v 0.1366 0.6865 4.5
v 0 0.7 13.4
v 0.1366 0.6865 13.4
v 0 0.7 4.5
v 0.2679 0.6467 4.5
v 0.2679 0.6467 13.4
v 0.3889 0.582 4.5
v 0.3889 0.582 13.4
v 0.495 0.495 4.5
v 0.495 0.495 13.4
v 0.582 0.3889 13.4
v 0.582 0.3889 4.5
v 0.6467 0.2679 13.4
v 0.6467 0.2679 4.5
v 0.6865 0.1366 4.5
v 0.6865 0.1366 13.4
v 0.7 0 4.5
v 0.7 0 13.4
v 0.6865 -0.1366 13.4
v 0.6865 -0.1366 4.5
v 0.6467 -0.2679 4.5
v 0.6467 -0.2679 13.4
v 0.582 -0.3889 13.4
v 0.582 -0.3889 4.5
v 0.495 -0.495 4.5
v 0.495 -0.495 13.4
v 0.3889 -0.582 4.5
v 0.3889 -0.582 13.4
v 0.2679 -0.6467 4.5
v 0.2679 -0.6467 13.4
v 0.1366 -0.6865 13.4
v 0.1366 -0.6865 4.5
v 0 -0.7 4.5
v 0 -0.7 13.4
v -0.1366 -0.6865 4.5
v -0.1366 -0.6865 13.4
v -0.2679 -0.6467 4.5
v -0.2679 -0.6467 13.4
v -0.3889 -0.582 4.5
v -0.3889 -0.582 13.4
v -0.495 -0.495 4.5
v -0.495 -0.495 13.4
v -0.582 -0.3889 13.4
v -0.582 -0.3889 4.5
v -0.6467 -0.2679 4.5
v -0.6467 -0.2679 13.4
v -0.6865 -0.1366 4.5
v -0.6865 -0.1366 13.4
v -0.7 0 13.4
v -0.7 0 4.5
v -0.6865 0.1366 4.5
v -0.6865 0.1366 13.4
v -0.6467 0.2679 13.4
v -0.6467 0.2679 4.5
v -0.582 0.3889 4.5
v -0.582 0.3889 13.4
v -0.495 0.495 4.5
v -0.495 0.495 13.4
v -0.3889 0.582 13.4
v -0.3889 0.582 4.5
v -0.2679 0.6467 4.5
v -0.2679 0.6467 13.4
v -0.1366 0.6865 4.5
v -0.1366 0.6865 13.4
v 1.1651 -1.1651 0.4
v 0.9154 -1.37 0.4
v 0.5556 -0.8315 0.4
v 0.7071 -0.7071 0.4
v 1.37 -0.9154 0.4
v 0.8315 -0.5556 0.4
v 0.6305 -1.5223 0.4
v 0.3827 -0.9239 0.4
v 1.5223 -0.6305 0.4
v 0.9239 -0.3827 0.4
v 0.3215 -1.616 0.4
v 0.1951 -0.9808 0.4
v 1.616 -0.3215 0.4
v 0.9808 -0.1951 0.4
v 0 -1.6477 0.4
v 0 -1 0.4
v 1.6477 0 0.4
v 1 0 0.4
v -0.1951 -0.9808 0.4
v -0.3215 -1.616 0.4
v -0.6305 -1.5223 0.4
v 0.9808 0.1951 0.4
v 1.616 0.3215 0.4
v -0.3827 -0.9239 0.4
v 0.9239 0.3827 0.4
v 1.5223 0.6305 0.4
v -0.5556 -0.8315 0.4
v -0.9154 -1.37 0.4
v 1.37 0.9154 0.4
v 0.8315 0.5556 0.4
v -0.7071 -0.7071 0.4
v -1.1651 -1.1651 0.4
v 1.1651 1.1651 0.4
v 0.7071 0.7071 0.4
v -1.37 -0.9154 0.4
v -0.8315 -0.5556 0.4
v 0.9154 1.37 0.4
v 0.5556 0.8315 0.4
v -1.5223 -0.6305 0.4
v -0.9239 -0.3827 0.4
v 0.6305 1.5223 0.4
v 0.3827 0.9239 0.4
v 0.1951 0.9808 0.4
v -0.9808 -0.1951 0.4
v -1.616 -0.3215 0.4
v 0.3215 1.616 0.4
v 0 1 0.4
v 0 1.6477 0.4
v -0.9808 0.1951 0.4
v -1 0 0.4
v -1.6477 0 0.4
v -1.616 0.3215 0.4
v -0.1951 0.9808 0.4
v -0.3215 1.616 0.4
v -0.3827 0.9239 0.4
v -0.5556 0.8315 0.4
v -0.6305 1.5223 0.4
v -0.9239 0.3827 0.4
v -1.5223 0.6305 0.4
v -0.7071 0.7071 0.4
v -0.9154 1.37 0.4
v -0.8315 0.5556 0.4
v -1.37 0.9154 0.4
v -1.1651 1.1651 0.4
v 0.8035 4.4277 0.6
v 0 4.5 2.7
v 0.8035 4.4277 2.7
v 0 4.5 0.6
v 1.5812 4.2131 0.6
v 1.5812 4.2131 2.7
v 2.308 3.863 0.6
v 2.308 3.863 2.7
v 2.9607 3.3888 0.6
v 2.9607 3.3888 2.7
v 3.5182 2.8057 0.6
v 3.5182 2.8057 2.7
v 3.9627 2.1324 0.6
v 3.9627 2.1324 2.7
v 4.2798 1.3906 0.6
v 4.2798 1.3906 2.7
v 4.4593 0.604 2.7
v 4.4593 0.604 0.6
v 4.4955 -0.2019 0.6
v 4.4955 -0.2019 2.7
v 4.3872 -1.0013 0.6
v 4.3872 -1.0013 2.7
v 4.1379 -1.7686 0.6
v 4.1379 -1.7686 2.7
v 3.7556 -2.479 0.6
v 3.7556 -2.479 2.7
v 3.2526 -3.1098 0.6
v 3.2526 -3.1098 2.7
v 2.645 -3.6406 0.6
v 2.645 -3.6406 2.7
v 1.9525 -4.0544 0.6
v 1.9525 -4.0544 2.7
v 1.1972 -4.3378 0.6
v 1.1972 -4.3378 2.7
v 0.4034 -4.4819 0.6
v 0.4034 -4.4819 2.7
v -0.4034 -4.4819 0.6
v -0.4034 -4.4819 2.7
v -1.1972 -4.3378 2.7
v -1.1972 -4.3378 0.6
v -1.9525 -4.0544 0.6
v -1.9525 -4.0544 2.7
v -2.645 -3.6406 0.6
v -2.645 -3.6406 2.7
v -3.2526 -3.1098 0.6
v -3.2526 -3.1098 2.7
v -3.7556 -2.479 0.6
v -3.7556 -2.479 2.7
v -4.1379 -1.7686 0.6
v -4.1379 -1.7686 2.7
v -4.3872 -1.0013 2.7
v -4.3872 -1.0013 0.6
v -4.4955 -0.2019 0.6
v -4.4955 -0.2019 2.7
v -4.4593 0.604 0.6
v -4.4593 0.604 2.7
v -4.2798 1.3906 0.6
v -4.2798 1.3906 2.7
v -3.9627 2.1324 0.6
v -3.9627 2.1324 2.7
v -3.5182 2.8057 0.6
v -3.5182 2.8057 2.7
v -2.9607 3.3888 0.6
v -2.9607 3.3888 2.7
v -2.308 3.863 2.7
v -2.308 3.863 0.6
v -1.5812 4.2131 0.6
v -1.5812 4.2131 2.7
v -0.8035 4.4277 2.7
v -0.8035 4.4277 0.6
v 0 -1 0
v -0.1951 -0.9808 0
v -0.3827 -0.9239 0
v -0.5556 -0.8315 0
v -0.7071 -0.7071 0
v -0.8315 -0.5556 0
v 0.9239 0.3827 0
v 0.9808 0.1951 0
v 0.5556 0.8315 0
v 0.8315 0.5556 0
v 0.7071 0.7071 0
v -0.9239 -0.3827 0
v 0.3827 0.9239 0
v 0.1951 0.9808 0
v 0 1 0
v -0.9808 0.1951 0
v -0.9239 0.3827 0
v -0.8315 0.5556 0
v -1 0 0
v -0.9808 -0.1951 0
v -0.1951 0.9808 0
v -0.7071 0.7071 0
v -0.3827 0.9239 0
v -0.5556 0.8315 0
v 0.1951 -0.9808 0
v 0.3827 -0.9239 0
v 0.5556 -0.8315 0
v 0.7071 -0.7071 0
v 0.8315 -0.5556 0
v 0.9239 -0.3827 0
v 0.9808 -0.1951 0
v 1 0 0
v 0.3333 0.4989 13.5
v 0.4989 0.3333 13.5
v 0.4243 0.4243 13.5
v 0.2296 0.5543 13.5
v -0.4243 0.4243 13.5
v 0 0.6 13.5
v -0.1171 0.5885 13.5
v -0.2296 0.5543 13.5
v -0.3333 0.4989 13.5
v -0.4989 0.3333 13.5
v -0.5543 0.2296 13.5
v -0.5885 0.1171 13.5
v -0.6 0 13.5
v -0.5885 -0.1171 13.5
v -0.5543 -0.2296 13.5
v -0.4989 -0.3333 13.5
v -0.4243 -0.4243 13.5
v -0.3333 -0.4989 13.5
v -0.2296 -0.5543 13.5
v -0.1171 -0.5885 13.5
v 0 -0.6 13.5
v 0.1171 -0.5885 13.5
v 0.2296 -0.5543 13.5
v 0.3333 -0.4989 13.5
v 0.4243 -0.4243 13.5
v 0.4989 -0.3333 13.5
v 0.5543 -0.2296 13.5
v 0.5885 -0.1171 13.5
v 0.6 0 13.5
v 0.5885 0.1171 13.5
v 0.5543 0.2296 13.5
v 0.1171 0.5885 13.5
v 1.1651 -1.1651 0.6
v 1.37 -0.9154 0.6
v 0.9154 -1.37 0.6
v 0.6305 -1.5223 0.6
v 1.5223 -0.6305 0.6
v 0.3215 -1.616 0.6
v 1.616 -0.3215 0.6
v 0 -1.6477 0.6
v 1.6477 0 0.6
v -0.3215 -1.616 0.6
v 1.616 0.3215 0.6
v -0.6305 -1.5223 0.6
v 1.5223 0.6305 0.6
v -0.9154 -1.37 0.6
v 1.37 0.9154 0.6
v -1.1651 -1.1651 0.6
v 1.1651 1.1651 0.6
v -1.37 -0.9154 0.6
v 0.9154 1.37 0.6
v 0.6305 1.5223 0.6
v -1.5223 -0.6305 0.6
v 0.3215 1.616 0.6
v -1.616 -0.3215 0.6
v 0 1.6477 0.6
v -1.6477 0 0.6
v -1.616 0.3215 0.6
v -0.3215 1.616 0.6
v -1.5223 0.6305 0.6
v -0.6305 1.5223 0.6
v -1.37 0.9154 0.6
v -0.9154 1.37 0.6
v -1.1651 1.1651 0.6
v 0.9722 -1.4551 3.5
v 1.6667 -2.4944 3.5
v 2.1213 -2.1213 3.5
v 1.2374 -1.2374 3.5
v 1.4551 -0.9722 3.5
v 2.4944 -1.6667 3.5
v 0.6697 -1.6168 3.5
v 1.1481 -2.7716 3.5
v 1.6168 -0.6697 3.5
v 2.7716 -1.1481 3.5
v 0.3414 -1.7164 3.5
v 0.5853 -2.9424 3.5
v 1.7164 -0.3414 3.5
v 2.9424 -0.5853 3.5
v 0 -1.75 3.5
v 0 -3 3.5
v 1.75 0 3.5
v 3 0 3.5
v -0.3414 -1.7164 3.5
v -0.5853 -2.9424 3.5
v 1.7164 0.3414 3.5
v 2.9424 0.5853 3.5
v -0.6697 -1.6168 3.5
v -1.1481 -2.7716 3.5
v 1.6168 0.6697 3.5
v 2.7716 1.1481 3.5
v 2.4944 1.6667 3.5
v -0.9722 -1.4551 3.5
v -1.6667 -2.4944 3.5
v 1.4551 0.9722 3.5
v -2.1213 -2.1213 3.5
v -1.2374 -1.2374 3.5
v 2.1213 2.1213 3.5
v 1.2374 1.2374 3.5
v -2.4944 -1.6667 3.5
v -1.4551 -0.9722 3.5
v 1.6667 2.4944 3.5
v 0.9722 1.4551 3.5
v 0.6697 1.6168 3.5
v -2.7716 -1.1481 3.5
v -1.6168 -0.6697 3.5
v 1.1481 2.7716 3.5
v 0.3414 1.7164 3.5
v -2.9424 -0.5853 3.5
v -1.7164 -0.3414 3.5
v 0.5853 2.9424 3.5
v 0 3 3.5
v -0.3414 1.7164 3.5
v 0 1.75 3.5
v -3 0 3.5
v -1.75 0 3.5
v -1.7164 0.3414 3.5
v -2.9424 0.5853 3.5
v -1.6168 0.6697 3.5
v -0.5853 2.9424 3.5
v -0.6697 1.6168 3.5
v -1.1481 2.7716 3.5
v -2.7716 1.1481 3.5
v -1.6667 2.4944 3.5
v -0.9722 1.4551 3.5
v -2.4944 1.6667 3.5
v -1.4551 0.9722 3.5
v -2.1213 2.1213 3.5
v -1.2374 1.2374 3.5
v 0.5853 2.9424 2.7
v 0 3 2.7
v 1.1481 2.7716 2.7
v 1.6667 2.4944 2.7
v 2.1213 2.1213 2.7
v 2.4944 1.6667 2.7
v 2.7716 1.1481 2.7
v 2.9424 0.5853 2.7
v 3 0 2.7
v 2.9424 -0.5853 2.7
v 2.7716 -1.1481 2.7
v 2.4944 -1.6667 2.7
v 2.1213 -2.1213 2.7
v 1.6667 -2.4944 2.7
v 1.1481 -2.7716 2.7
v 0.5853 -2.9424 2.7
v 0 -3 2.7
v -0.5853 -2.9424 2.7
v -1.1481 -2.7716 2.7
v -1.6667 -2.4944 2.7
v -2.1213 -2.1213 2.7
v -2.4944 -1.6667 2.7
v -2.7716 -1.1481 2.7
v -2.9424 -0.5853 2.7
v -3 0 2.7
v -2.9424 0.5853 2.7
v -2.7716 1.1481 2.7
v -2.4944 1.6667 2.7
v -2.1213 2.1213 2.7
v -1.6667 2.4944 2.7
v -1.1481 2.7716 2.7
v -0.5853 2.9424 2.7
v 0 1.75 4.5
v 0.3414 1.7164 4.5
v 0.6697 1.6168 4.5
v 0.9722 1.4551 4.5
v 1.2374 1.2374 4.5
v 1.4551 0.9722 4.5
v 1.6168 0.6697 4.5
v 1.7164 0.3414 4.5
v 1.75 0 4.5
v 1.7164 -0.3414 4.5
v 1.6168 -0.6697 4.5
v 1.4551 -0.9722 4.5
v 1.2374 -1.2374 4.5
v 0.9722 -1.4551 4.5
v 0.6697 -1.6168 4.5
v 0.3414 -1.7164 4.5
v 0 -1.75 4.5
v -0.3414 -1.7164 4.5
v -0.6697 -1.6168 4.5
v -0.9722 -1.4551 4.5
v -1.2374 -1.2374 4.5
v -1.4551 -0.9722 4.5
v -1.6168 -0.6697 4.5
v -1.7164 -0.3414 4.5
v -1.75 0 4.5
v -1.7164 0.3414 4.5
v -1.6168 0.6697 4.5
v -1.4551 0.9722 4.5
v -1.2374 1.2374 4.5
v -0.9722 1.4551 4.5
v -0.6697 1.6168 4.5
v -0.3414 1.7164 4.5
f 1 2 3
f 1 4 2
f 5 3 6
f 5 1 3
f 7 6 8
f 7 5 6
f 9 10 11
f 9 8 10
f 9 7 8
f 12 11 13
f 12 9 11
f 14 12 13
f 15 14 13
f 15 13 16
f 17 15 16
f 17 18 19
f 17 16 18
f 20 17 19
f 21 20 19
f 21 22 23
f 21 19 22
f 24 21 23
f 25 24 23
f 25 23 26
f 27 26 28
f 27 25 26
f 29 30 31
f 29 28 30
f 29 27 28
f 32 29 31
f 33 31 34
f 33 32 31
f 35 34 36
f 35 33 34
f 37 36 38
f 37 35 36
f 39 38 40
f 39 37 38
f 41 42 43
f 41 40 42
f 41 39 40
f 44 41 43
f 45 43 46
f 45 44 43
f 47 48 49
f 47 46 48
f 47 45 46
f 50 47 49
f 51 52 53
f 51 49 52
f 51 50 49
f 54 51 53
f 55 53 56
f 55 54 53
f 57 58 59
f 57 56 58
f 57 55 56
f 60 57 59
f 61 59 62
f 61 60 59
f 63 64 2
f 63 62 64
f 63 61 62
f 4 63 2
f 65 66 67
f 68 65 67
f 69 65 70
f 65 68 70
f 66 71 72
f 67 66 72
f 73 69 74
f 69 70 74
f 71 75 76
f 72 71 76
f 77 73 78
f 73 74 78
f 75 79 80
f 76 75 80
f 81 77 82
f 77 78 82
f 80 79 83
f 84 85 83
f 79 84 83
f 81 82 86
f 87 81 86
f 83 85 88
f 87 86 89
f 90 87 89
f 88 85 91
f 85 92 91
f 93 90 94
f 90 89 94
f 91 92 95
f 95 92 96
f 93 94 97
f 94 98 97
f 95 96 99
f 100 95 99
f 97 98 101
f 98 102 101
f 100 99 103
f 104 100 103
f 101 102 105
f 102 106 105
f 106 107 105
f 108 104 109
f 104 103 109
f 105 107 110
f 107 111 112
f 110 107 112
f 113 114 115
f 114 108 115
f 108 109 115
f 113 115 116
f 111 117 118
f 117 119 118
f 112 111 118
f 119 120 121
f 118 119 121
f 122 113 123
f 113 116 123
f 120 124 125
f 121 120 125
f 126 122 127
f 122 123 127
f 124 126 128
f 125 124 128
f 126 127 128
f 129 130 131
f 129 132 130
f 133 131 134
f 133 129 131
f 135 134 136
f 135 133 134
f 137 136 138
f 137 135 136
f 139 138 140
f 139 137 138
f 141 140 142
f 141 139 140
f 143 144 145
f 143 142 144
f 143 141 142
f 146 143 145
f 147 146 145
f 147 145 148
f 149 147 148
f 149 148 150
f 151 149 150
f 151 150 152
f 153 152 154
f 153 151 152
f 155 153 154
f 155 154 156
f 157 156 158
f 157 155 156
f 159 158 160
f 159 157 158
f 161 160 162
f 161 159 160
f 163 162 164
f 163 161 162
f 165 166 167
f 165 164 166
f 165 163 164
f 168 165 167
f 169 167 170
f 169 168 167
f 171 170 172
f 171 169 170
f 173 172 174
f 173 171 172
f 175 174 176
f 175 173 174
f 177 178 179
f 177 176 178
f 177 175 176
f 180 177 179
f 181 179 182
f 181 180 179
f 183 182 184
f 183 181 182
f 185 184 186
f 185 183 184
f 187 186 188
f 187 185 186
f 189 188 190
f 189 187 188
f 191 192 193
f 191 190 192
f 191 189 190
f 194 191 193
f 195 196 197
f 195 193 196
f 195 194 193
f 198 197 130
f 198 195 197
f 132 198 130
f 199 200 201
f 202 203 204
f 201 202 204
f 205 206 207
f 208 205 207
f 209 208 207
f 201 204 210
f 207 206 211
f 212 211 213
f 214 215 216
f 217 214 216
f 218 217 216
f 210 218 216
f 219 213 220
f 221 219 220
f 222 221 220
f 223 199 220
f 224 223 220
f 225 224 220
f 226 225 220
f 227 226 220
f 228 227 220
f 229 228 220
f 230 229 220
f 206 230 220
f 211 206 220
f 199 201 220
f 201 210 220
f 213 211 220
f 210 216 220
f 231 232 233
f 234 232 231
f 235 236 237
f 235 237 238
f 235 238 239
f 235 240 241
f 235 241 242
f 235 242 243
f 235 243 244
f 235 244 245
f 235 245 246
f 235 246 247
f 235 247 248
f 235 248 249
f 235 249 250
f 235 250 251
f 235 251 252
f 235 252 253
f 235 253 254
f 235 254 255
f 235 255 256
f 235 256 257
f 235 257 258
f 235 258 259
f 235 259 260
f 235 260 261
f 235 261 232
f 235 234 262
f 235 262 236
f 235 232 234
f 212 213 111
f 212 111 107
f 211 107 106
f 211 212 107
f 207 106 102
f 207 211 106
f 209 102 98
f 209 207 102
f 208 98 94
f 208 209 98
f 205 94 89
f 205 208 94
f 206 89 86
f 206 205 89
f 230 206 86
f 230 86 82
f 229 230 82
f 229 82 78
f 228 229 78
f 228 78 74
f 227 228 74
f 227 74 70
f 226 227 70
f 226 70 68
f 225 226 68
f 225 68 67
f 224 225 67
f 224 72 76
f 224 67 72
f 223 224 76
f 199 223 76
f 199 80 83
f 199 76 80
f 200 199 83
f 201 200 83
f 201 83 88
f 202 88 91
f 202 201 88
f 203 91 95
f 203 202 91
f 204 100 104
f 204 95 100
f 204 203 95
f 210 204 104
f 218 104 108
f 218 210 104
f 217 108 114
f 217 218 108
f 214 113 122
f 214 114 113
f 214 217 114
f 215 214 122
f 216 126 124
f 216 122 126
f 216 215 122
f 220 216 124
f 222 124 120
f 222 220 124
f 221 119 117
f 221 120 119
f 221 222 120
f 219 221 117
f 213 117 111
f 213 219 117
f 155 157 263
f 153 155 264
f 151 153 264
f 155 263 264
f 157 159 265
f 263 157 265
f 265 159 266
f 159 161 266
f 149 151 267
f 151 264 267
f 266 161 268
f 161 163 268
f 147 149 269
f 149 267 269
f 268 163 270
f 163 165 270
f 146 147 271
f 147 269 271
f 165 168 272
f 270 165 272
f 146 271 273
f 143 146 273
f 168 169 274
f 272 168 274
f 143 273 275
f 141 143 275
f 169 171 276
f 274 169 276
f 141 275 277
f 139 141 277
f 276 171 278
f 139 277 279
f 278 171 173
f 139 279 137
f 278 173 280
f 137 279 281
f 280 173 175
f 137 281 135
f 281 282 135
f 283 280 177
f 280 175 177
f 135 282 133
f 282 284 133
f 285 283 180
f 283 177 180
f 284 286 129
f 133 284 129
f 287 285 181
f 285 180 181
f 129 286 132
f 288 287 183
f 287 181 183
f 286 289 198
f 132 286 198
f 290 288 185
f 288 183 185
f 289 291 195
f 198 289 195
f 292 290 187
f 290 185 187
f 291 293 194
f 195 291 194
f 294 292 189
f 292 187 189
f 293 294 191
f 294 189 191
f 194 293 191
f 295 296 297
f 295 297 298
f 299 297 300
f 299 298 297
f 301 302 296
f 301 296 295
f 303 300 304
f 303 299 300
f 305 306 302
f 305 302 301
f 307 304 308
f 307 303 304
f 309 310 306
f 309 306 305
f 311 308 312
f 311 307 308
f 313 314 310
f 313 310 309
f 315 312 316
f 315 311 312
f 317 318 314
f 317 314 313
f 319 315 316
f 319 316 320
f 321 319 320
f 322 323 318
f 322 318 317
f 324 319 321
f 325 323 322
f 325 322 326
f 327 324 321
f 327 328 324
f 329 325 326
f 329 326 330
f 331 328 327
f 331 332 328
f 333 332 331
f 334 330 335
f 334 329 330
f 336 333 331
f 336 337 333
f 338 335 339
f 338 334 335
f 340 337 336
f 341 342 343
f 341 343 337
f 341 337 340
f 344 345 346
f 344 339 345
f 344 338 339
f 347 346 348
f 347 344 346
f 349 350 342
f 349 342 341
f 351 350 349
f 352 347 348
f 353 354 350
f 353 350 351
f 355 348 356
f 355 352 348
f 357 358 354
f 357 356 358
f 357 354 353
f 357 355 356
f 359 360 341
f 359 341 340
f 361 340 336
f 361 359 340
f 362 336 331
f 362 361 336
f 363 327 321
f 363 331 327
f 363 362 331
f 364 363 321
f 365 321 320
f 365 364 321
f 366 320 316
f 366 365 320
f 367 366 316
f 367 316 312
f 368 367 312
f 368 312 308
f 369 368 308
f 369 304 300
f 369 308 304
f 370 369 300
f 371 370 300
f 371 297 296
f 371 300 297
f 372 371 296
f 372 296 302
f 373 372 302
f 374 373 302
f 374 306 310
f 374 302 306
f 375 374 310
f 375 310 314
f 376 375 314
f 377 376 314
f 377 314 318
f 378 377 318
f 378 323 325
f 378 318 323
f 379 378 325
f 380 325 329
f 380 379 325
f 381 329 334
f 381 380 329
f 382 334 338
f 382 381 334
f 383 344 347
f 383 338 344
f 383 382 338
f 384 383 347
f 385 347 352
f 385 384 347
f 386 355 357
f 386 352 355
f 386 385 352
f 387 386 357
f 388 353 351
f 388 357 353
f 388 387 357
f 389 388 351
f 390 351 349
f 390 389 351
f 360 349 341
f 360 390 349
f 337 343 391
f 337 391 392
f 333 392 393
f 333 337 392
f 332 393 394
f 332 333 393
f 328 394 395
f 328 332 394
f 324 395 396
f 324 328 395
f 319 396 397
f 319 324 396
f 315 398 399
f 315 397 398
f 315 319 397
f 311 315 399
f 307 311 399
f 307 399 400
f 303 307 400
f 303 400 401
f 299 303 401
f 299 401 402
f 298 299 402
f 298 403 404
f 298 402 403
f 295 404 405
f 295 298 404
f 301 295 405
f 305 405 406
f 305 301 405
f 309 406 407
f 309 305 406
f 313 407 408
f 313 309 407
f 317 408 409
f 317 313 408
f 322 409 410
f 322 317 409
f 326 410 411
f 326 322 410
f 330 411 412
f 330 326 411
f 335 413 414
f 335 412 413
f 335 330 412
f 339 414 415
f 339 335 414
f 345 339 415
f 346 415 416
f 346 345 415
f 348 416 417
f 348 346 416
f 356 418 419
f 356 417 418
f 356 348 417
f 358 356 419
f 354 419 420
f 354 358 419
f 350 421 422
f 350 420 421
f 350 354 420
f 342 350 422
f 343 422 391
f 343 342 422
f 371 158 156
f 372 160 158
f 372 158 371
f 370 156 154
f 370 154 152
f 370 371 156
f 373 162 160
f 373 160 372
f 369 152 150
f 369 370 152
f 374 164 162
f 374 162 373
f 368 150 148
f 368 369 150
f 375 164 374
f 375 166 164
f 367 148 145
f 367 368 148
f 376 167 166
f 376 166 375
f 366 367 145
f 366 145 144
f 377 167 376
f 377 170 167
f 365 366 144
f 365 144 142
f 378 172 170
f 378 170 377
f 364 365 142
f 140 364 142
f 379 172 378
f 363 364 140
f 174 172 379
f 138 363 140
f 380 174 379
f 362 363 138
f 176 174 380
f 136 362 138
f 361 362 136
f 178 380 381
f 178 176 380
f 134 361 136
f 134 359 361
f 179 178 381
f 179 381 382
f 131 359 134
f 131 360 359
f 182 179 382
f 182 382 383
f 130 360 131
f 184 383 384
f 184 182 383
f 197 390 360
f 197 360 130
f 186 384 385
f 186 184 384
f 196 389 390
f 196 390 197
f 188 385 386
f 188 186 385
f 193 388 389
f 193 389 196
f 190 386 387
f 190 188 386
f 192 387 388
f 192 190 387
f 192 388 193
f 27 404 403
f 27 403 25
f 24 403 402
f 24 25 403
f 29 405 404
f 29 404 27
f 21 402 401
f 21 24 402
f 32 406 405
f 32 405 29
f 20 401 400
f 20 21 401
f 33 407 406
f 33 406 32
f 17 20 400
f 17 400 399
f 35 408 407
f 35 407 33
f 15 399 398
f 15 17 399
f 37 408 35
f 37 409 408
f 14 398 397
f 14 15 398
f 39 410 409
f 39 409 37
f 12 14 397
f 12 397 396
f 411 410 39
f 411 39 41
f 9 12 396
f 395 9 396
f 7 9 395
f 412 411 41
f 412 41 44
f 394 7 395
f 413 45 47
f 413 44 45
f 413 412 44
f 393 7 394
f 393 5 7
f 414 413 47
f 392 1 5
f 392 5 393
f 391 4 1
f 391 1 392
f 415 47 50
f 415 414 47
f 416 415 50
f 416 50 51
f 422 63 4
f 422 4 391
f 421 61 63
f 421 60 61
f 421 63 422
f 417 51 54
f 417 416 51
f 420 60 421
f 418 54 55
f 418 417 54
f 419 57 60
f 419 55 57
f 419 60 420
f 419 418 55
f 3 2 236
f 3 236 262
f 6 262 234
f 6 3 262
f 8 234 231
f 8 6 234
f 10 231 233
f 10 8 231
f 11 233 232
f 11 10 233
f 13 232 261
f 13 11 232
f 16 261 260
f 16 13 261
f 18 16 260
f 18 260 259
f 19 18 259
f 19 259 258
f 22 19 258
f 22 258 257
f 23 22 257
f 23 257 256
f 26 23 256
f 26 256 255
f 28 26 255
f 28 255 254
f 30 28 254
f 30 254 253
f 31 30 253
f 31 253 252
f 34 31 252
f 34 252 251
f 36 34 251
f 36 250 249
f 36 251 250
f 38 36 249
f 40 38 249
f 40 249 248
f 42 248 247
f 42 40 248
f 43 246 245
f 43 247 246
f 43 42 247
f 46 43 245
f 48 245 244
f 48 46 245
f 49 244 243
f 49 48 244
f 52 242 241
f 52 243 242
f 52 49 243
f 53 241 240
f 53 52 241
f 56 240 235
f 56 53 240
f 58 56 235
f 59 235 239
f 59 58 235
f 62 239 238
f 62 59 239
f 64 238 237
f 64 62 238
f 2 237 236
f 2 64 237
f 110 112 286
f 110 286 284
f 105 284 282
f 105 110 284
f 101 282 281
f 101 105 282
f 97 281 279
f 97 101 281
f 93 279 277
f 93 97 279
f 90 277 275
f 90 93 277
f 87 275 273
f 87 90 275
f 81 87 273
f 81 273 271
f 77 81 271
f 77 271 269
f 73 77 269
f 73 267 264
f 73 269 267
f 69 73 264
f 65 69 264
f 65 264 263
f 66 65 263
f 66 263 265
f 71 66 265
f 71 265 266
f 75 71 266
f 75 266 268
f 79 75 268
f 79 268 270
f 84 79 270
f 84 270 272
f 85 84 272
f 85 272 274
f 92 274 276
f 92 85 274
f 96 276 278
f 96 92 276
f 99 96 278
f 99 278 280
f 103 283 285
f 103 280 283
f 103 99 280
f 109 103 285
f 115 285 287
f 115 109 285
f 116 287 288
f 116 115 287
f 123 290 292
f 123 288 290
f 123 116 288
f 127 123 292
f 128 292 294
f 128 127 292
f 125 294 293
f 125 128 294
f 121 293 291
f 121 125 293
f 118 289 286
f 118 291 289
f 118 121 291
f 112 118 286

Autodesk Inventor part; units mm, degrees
ref_plane "YZ Plane" through (0, 0, 0) normal (1, 0, 0) x (0, 1, 0)
ref_plane "XZ Plane" through (0, 0, 0) normal (0, 1, 0) x (-1, 0, 0)
ref_plane "XY Plane" through (0, 0, 0) normal (0, 0, 1) x (1, 0, 0)
sketch "Эскиз1" plane through (0, 0, 0) normal (1, 0, 0) x (0, 1, 0)
  line L0 (0, 13.5) -> (0.7, 13.5)
  line L1 (0.7, 13.5) -> (0.7, 4.5)
  line L2 (0.7, 4.5) -> (1.75, 4.5)
  line L3 (1.75, 4.5) -> (1.75, 3.5)
  line L4 (1.75, 3.5) -> (3, 3.5)
  line L5 (3, 3.5) -> (3, 2.7)
  line L6 (3, 2.7) -> (4.5, 2.7)
  line L7 (4.5, 2.7) -> (4.5, 0.6)
  line L8 (0, 0) -> (0, 13.5)
  line L9 (1.6477, 0.4) -> (1, 0.4)
  line L10 (1, 0.4) -> (1, 0)
  line L11 (1, 0) -> (0, 0)
  line L12 (0, -2.7) -> (0, 16.2) projected
  line L13 (4.5, 0.6) -> (1.6477, 0.6)
  line L14 (1.6477, 0.6) -> (1.6477, 0.4)
  dimension "d0" = 1.4
  dimension "d1" = 13.5
  dimension "d2" = 9
  dimension "d3" = 2
  dimension "d4" = 0.4
  dimension "d5" = 0.2
  dimension "d6" = 9
  dimension "d7" = 1
  dimension "d8" = 0.8
  dimension "d9" = 3.5
  dimension "d10" = 6
revolve "Вращение1" add sketch "Эскиз1" angle 360 about axis through (0, 0, -10) along (0, 0, 1)
chamfer "Фаска1" distance 0.1 angle 45 1 edges at (0, -0.7, 13.5)
properties part number "Вал последний с чем то" material "Латунь, мягкая, желтая"
